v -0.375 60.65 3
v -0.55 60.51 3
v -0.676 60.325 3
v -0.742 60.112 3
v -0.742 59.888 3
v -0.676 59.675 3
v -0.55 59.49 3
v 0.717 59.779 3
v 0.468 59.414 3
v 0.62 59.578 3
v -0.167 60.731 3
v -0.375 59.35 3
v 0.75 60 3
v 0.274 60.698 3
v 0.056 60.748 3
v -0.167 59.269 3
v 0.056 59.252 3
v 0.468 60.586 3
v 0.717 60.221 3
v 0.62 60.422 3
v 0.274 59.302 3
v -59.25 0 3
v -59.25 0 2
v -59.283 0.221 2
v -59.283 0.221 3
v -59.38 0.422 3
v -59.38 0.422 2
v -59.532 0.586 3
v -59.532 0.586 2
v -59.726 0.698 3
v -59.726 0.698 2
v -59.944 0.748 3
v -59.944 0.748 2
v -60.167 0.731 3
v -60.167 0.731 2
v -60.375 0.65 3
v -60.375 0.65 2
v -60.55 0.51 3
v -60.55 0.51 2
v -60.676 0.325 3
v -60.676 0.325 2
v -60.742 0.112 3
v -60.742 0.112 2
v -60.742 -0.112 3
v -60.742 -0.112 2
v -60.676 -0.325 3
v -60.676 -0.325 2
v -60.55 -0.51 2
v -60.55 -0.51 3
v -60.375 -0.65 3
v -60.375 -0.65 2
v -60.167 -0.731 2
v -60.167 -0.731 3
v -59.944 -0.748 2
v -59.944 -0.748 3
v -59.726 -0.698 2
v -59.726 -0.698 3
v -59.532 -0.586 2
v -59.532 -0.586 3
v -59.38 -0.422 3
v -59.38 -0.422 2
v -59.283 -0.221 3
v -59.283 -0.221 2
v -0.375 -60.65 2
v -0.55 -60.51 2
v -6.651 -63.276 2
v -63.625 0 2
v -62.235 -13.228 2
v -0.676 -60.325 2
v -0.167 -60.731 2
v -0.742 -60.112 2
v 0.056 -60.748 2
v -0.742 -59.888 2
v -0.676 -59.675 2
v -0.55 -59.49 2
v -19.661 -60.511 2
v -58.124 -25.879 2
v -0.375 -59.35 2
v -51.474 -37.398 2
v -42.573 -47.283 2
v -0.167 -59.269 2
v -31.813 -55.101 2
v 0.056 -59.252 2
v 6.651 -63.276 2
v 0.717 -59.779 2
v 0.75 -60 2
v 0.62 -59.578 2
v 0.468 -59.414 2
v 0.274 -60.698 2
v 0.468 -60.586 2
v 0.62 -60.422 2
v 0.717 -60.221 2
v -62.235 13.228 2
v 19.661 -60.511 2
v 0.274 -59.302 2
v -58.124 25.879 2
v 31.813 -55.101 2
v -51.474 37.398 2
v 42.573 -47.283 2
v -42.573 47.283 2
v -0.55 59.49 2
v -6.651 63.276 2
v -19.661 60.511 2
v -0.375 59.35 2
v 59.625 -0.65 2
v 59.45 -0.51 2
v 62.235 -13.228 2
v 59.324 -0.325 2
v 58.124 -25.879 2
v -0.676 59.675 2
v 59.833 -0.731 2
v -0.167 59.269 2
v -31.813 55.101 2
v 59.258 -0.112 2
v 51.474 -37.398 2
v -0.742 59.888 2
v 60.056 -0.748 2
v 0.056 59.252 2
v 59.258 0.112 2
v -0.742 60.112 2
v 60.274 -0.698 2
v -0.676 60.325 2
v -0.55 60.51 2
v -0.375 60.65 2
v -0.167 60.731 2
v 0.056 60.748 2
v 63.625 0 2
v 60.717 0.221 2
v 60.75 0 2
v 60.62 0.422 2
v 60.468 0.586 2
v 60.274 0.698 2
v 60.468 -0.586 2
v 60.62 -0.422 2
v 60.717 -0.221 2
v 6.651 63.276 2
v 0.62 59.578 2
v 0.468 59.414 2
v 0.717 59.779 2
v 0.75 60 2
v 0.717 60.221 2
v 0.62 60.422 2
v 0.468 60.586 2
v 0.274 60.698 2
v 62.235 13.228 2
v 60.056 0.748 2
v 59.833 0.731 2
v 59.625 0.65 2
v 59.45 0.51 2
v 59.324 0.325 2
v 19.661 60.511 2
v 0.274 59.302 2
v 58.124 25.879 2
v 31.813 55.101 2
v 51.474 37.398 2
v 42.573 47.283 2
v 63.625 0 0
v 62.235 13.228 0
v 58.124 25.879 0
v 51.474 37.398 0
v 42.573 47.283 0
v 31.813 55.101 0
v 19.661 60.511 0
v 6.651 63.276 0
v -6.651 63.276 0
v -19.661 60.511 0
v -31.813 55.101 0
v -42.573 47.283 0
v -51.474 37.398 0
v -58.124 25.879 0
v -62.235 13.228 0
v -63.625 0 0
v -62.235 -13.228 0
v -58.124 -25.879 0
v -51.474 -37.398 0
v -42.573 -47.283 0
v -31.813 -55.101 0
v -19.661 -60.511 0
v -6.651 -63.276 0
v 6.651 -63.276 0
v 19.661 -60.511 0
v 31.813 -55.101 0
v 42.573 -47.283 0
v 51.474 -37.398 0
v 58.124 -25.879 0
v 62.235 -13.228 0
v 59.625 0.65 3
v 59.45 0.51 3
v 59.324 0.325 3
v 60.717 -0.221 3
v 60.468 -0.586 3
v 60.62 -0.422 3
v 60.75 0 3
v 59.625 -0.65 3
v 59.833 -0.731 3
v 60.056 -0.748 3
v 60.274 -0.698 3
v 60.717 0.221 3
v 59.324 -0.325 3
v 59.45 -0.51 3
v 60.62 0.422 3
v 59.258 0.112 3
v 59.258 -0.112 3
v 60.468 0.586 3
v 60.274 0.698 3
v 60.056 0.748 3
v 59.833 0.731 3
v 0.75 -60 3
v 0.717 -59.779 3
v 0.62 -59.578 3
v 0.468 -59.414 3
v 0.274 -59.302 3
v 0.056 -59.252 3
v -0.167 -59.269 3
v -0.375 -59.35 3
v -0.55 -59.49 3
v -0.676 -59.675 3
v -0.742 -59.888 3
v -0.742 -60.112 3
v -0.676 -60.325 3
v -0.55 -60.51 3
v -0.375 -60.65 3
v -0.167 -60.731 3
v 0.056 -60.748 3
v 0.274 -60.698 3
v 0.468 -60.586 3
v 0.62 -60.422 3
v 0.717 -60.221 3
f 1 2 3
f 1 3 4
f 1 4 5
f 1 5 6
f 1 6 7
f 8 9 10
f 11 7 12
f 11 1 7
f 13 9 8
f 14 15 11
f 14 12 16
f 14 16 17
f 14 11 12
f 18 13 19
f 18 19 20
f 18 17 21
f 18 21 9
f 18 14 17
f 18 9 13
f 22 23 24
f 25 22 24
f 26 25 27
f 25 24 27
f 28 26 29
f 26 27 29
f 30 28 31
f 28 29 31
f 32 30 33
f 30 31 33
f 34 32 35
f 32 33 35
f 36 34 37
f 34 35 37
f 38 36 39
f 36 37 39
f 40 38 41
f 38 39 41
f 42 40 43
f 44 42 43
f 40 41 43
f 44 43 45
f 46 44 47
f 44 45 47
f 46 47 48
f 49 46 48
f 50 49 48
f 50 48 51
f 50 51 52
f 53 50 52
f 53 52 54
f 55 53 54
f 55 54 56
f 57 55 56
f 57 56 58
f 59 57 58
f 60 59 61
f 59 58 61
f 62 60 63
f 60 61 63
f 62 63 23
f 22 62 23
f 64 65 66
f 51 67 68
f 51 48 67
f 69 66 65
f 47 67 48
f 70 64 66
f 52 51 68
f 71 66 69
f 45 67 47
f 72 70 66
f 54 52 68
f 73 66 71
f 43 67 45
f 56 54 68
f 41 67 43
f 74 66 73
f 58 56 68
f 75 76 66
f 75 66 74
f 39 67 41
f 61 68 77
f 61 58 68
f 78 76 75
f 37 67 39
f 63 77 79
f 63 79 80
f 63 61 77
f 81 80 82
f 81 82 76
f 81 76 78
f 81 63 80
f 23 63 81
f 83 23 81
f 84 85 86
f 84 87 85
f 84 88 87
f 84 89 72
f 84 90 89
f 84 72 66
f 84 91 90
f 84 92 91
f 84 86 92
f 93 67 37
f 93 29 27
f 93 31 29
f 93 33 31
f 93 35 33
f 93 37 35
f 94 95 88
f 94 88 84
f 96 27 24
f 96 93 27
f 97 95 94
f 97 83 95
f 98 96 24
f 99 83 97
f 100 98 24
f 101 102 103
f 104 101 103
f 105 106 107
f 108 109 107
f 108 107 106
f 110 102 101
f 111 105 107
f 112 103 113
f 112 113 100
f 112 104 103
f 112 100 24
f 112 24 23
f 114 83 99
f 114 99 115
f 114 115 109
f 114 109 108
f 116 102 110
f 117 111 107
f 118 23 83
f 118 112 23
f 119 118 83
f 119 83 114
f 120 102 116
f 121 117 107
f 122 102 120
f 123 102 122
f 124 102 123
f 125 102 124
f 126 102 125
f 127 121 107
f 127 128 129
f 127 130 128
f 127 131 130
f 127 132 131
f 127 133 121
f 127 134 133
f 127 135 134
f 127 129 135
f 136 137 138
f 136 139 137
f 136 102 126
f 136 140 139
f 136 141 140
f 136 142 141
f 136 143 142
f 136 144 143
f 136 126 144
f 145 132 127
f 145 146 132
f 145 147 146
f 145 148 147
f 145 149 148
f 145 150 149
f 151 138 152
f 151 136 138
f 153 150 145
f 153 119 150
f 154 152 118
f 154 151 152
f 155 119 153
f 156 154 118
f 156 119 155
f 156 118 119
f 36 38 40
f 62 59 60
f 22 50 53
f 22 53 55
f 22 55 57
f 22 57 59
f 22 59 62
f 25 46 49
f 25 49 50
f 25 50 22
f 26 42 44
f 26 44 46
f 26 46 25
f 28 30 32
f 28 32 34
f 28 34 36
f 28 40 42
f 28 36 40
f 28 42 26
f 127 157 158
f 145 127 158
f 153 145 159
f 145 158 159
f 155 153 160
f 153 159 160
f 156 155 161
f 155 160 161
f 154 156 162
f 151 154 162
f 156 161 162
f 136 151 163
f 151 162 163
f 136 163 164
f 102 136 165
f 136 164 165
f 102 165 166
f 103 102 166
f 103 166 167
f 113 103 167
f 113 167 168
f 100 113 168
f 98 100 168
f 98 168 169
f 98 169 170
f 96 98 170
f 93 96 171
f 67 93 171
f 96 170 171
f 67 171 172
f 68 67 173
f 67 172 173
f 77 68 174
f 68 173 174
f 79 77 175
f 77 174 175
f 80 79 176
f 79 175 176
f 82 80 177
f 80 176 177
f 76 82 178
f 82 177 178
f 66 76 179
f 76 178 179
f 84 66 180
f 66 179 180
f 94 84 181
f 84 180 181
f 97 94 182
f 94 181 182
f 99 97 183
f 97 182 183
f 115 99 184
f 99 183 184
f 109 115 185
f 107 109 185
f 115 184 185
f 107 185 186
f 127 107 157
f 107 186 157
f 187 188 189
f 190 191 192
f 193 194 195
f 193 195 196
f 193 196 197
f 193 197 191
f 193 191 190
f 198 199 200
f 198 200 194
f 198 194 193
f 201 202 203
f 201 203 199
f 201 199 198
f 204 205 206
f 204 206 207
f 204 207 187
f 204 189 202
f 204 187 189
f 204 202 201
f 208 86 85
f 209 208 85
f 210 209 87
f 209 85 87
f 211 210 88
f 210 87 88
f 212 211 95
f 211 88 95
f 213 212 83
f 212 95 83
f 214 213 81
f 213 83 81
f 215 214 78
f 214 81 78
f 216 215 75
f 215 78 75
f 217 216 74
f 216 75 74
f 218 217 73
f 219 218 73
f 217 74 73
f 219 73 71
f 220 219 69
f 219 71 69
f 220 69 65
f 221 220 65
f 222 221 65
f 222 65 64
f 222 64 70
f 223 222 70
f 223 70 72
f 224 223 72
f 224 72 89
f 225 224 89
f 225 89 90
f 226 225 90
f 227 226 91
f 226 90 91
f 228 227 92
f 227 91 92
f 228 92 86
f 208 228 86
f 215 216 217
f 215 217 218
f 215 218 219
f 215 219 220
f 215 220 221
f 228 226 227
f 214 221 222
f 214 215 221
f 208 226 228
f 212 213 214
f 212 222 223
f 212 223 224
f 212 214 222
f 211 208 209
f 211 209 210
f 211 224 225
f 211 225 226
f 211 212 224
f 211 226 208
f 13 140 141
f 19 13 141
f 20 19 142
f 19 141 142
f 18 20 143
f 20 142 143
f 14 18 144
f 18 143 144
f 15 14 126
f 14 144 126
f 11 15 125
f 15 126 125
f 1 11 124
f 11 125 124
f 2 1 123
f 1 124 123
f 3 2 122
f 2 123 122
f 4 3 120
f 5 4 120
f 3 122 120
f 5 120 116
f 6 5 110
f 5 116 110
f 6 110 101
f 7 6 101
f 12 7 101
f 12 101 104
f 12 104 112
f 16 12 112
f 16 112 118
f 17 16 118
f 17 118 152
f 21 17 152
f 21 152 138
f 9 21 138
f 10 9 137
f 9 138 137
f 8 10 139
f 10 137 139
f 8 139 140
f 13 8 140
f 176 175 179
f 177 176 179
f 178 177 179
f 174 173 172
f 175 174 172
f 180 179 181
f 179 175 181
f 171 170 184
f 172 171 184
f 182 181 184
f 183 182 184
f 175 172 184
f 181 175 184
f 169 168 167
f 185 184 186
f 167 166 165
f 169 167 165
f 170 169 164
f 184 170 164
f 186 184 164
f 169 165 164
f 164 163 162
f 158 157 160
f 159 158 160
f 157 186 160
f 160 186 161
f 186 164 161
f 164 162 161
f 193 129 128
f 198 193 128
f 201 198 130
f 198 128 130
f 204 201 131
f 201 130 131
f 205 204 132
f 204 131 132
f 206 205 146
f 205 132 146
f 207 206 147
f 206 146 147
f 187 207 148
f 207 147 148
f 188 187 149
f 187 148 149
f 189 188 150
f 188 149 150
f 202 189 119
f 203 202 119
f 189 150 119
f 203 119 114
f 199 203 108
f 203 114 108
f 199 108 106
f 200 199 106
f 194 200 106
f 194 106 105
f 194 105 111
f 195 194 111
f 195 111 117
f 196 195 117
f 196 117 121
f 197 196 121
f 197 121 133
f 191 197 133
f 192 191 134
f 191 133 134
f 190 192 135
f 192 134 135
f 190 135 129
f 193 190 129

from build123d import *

# Parameters (mm, degrees)
F0_R     = 63.625
F1_DEPTH = 2
F2_R     = 0.75
F3_DEPTH = 1


with BuildPart() as f1:
    # F0 (on Top) → F1 (new body)
    with BuildSketch(Plane.XY):
        Circle(F0_R)
    extrude(amount=F1_DEPTH)

    # F2 (on face) → F3 (join)
    with BuildSketch(Plane.XY.offset(2)):
        with Locations((0, 60)):
            Circle(F2_R)
        with Locations((-60, 0)):
            Circle(F2_R)
        with Locations((0, -60)):
            Circle(F2_R)
        with Locations((60, 0)):
            Circle(F2_R)
    extrude(amount=F3_DEPTH)


solid = f1.part
